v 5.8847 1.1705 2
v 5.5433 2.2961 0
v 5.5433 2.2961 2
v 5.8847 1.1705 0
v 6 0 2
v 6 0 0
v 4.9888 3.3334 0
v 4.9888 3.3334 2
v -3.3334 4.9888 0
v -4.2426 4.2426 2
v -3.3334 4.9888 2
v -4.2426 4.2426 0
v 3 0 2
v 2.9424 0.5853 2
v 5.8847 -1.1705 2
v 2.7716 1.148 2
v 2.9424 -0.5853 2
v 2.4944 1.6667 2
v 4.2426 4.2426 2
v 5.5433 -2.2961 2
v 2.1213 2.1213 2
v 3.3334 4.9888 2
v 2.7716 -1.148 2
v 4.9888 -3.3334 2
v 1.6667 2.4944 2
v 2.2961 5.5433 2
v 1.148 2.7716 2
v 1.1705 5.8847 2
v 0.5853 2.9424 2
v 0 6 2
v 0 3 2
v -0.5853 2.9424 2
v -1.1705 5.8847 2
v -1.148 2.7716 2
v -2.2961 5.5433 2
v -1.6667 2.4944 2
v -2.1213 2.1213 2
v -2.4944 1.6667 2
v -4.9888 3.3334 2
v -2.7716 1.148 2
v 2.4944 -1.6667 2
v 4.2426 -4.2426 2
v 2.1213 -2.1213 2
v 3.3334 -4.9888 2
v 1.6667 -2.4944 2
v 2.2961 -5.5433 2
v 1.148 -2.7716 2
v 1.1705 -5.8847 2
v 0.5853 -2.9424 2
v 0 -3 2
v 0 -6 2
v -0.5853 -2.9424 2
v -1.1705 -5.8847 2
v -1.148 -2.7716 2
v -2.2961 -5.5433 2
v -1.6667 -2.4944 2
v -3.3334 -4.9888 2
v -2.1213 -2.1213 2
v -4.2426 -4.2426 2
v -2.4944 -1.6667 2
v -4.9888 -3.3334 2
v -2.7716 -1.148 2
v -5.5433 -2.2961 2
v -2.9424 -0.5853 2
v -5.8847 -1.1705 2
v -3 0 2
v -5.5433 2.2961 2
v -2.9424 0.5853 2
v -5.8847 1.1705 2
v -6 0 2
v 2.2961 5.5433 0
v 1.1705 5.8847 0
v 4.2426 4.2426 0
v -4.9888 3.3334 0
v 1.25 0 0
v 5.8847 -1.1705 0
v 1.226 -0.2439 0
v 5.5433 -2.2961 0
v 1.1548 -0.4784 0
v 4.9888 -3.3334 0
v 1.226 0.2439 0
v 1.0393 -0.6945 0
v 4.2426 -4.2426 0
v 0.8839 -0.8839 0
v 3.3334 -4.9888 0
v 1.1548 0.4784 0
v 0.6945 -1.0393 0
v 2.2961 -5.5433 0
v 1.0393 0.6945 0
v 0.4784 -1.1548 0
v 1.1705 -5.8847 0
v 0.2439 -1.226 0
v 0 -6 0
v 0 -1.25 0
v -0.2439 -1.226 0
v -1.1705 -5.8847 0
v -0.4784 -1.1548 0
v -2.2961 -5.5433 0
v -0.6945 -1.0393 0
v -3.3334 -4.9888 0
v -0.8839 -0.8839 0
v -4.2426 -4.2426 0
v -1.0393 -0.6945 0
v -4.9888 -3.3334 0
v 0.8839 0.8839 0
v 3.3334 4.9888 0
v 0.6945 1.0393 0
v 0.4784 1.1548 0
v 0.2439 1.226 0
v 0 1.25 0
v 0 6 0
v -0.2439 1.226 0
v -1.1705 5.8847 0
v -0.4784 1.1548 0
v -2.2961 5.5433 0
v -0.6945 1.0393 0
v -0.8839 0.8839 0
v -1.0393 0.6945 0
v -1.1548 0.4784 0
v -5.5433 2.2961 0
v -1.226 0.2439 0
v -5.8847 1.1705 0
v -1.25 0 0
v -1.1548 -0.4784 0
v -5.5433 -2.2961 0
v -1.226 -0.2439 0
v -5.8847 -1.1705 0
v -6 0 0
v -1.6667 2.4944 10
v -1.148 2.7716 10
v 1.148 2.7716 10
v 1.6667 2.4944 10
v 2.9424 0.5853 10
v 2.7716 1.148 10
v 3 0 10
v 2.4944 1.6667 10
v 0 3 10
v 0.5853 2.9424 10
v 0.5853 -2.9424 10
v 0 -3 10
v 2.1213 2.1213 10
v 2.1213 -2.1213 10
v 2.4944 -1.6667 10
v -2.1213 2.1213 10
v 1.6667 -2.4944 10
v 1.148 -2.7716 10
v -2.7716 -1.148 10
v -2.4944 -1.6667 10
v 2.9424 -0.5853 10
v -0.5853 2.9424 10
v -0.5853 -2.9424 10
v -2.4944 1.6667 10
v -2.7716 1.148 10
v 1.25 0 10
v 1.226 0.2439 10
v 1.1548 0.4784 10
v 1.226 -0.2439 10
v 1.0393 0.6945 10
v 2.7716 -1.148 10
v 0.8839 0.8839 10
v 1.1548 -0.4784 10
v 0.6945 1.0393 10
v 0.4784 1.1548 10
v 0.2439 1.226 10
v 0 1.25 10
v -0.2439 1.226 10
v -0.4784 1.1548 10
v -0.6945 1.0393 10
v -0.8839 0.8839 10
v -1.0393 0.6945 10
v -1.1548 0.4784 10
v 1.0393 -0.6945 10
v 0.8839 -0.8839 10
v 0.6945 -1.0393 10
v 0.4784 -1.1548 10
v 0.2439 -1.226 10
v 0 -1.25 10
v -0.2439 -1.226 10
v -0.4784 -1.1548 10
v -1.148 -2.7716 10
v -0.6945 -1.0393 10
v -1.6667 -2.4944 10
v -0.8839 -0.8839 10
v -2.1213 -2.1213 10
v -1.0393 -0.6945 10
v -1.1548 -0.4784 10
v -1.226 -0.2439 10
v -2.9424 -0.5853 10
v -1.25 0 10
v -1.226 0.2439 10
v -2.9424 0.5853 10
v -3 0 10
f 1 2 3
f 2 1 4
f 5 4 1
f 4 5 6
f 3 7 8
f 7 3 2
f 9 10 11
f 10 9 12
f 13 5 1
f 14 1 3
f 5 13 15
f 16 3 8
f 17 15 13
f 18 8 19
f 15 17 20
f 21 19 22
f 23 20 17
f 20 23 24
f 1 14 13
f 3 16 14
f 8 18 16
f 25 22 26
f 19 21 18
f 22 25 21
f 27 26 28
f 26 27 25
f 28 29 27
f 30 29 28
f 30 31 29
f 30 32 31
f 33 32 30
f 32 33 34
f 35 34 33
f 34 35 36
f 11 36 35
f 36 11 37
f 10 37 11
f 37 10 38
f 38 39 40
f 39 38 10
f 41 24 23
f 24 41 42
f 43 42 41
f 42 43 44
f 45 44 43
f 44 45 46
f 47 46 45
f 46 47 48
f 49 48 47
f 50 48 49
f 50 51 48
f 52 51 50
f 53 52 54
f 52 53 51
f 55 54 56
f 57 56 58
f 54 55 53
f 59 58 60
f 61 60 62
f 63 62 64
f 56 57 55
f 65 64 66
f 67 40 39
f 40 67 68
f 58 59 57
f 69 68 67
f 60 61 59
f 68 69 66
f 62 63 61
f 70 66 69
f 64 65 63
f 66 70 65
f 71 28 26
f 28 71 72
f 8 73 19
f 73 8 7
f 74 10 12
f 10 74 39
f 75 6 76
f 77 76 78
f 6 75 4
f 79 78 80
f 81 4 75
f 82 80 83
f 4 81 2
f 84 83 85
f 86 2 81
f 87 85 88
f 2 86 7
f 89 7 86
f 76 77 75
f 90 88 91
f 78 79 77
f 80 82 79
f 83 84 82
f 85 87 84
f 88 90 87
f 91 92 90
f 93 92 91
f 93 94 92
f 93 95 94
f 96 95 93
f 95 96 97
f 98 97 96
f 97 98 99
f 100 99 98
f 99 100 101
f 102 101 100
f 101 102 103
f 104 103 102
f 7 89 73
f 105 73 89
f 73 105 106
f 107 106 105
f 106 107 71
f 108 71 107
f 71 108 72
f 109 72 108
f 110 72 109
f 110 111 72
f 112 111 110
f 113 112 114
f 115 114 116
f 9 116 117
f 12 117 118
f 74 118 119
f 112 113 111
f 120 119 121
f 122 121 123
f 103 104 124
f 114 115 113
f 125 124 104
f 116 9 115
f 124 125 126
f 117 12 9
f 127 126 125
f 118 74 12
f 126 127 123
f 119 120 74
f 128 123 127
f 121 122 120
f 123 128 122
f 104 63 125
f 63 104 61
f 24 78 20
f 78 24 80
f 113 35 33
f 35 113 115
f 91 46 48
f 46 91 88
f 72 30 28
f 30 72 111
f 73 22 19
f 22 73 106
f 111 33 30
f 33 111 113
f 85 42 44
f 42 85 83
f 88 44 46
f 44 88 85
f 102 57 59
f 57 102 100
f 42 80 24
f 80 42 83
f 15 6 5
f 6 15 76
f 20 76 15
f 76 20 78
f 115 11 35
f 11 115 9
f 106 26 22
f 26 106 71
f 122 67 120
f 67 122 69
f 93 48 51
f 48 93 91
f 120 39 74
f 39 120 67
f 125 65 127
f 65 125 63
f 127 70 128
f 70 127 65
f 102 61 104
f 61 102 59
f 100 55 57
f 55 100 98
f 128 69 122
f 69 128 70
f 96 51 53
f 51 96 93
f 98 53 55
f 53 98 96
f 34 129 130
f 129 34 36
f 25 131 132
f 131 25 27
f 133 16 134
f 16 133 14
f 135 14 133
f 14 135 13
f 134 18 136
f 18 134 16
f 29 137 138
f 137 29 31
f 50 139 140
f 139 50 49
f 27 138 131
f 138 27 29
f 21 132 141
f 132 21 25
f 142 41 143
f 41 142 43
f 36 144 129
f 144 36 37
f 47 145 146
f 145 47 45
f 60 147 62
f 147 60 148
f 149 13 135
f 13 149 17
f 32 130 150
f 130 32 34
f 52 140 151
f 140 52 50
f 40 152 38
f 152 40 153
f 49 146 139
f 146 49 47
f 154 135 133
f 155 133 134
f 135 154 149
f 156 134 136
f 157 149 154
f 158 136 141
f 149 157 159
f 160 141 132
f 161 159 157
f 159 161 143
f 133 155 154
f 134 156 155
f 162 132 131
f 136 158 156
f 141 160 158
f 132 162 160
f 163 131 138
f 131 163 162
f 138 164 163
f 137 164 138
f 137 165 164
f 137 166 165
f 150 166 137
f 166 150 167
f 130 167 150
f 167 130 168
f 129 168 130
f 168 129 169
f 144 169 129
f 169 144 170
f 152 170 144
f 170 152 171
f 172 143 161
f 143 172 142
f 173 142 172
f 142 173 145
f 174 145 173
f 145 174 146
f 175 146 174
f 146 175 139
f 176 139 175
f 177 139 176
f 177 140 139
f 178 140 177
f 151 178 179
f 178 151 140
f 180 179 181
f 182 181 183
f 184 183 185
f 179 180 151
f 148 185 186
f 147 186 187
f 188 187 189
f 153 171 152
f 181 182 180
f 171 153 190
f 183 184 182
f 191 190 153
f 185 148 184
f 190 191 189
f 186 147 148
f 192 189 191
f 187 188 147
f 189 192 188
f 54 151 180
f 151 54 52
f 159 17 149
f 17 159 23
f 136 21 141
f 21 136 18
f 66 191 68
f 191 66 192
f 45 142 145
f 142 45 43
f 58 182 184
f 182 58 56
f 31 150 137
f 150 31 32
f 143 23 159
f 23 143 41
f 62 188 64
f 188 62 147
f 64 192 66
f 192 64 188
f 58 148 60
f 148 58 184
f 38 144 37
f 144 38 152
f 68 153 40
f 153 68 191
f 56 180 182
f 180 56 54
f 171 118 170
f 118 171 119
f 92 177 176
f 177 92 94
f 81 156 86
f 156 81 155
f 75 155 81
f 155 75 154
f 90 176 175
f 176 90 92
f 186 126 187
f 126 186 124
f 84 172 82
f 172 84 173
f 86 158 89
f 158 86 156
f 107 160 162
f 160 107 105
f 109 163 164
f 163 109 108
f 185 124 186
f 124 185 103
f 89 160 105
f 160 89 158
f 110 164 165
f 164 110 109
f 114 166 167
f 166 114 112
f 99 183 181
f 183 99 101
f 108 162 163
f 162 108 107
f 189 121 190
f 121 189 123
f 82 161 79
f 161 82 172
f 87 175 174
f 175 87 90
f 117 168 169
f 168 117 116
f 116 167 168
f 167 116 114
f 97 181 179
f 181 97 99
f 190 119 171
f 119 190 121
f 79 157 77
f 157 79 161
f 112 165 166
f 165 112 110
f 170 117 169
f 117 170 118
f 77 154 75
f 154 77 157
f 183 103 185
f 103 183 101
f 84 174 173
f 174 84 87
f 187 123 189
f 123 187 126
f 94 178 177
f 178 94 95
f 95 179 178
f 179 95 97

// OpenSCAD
$fn = 32;

// ----------------------------------------------------------------------
// Micro post: flanged post, 5-20 mm class
// ----------------------------------------------------------------------

// --- parameters (mm) ---
post_d = 6;               // post diameter
post_h = 8;               // post height above the flange
flange_d = 12;            // flange diameter
flange_t = 2;             // flange thickness
bore_d = 2.5;             // through bore
fit_tol = 0.05;           // tolerance for press fits, mm
free_tol = 0.2;           // tolerance for clearance fits, mm

total_h = post_h + flange_t;  // overall height

difference() {
  union() {
    cylinder(h = flange_t, d = flange_d);
    translate([0, 0, flange_t]) cylinder(h = post_h, d = post_d);
  }
  translate([0, 0, -1]) cylinder(h = total_h + 2, d = bore_d);
}
